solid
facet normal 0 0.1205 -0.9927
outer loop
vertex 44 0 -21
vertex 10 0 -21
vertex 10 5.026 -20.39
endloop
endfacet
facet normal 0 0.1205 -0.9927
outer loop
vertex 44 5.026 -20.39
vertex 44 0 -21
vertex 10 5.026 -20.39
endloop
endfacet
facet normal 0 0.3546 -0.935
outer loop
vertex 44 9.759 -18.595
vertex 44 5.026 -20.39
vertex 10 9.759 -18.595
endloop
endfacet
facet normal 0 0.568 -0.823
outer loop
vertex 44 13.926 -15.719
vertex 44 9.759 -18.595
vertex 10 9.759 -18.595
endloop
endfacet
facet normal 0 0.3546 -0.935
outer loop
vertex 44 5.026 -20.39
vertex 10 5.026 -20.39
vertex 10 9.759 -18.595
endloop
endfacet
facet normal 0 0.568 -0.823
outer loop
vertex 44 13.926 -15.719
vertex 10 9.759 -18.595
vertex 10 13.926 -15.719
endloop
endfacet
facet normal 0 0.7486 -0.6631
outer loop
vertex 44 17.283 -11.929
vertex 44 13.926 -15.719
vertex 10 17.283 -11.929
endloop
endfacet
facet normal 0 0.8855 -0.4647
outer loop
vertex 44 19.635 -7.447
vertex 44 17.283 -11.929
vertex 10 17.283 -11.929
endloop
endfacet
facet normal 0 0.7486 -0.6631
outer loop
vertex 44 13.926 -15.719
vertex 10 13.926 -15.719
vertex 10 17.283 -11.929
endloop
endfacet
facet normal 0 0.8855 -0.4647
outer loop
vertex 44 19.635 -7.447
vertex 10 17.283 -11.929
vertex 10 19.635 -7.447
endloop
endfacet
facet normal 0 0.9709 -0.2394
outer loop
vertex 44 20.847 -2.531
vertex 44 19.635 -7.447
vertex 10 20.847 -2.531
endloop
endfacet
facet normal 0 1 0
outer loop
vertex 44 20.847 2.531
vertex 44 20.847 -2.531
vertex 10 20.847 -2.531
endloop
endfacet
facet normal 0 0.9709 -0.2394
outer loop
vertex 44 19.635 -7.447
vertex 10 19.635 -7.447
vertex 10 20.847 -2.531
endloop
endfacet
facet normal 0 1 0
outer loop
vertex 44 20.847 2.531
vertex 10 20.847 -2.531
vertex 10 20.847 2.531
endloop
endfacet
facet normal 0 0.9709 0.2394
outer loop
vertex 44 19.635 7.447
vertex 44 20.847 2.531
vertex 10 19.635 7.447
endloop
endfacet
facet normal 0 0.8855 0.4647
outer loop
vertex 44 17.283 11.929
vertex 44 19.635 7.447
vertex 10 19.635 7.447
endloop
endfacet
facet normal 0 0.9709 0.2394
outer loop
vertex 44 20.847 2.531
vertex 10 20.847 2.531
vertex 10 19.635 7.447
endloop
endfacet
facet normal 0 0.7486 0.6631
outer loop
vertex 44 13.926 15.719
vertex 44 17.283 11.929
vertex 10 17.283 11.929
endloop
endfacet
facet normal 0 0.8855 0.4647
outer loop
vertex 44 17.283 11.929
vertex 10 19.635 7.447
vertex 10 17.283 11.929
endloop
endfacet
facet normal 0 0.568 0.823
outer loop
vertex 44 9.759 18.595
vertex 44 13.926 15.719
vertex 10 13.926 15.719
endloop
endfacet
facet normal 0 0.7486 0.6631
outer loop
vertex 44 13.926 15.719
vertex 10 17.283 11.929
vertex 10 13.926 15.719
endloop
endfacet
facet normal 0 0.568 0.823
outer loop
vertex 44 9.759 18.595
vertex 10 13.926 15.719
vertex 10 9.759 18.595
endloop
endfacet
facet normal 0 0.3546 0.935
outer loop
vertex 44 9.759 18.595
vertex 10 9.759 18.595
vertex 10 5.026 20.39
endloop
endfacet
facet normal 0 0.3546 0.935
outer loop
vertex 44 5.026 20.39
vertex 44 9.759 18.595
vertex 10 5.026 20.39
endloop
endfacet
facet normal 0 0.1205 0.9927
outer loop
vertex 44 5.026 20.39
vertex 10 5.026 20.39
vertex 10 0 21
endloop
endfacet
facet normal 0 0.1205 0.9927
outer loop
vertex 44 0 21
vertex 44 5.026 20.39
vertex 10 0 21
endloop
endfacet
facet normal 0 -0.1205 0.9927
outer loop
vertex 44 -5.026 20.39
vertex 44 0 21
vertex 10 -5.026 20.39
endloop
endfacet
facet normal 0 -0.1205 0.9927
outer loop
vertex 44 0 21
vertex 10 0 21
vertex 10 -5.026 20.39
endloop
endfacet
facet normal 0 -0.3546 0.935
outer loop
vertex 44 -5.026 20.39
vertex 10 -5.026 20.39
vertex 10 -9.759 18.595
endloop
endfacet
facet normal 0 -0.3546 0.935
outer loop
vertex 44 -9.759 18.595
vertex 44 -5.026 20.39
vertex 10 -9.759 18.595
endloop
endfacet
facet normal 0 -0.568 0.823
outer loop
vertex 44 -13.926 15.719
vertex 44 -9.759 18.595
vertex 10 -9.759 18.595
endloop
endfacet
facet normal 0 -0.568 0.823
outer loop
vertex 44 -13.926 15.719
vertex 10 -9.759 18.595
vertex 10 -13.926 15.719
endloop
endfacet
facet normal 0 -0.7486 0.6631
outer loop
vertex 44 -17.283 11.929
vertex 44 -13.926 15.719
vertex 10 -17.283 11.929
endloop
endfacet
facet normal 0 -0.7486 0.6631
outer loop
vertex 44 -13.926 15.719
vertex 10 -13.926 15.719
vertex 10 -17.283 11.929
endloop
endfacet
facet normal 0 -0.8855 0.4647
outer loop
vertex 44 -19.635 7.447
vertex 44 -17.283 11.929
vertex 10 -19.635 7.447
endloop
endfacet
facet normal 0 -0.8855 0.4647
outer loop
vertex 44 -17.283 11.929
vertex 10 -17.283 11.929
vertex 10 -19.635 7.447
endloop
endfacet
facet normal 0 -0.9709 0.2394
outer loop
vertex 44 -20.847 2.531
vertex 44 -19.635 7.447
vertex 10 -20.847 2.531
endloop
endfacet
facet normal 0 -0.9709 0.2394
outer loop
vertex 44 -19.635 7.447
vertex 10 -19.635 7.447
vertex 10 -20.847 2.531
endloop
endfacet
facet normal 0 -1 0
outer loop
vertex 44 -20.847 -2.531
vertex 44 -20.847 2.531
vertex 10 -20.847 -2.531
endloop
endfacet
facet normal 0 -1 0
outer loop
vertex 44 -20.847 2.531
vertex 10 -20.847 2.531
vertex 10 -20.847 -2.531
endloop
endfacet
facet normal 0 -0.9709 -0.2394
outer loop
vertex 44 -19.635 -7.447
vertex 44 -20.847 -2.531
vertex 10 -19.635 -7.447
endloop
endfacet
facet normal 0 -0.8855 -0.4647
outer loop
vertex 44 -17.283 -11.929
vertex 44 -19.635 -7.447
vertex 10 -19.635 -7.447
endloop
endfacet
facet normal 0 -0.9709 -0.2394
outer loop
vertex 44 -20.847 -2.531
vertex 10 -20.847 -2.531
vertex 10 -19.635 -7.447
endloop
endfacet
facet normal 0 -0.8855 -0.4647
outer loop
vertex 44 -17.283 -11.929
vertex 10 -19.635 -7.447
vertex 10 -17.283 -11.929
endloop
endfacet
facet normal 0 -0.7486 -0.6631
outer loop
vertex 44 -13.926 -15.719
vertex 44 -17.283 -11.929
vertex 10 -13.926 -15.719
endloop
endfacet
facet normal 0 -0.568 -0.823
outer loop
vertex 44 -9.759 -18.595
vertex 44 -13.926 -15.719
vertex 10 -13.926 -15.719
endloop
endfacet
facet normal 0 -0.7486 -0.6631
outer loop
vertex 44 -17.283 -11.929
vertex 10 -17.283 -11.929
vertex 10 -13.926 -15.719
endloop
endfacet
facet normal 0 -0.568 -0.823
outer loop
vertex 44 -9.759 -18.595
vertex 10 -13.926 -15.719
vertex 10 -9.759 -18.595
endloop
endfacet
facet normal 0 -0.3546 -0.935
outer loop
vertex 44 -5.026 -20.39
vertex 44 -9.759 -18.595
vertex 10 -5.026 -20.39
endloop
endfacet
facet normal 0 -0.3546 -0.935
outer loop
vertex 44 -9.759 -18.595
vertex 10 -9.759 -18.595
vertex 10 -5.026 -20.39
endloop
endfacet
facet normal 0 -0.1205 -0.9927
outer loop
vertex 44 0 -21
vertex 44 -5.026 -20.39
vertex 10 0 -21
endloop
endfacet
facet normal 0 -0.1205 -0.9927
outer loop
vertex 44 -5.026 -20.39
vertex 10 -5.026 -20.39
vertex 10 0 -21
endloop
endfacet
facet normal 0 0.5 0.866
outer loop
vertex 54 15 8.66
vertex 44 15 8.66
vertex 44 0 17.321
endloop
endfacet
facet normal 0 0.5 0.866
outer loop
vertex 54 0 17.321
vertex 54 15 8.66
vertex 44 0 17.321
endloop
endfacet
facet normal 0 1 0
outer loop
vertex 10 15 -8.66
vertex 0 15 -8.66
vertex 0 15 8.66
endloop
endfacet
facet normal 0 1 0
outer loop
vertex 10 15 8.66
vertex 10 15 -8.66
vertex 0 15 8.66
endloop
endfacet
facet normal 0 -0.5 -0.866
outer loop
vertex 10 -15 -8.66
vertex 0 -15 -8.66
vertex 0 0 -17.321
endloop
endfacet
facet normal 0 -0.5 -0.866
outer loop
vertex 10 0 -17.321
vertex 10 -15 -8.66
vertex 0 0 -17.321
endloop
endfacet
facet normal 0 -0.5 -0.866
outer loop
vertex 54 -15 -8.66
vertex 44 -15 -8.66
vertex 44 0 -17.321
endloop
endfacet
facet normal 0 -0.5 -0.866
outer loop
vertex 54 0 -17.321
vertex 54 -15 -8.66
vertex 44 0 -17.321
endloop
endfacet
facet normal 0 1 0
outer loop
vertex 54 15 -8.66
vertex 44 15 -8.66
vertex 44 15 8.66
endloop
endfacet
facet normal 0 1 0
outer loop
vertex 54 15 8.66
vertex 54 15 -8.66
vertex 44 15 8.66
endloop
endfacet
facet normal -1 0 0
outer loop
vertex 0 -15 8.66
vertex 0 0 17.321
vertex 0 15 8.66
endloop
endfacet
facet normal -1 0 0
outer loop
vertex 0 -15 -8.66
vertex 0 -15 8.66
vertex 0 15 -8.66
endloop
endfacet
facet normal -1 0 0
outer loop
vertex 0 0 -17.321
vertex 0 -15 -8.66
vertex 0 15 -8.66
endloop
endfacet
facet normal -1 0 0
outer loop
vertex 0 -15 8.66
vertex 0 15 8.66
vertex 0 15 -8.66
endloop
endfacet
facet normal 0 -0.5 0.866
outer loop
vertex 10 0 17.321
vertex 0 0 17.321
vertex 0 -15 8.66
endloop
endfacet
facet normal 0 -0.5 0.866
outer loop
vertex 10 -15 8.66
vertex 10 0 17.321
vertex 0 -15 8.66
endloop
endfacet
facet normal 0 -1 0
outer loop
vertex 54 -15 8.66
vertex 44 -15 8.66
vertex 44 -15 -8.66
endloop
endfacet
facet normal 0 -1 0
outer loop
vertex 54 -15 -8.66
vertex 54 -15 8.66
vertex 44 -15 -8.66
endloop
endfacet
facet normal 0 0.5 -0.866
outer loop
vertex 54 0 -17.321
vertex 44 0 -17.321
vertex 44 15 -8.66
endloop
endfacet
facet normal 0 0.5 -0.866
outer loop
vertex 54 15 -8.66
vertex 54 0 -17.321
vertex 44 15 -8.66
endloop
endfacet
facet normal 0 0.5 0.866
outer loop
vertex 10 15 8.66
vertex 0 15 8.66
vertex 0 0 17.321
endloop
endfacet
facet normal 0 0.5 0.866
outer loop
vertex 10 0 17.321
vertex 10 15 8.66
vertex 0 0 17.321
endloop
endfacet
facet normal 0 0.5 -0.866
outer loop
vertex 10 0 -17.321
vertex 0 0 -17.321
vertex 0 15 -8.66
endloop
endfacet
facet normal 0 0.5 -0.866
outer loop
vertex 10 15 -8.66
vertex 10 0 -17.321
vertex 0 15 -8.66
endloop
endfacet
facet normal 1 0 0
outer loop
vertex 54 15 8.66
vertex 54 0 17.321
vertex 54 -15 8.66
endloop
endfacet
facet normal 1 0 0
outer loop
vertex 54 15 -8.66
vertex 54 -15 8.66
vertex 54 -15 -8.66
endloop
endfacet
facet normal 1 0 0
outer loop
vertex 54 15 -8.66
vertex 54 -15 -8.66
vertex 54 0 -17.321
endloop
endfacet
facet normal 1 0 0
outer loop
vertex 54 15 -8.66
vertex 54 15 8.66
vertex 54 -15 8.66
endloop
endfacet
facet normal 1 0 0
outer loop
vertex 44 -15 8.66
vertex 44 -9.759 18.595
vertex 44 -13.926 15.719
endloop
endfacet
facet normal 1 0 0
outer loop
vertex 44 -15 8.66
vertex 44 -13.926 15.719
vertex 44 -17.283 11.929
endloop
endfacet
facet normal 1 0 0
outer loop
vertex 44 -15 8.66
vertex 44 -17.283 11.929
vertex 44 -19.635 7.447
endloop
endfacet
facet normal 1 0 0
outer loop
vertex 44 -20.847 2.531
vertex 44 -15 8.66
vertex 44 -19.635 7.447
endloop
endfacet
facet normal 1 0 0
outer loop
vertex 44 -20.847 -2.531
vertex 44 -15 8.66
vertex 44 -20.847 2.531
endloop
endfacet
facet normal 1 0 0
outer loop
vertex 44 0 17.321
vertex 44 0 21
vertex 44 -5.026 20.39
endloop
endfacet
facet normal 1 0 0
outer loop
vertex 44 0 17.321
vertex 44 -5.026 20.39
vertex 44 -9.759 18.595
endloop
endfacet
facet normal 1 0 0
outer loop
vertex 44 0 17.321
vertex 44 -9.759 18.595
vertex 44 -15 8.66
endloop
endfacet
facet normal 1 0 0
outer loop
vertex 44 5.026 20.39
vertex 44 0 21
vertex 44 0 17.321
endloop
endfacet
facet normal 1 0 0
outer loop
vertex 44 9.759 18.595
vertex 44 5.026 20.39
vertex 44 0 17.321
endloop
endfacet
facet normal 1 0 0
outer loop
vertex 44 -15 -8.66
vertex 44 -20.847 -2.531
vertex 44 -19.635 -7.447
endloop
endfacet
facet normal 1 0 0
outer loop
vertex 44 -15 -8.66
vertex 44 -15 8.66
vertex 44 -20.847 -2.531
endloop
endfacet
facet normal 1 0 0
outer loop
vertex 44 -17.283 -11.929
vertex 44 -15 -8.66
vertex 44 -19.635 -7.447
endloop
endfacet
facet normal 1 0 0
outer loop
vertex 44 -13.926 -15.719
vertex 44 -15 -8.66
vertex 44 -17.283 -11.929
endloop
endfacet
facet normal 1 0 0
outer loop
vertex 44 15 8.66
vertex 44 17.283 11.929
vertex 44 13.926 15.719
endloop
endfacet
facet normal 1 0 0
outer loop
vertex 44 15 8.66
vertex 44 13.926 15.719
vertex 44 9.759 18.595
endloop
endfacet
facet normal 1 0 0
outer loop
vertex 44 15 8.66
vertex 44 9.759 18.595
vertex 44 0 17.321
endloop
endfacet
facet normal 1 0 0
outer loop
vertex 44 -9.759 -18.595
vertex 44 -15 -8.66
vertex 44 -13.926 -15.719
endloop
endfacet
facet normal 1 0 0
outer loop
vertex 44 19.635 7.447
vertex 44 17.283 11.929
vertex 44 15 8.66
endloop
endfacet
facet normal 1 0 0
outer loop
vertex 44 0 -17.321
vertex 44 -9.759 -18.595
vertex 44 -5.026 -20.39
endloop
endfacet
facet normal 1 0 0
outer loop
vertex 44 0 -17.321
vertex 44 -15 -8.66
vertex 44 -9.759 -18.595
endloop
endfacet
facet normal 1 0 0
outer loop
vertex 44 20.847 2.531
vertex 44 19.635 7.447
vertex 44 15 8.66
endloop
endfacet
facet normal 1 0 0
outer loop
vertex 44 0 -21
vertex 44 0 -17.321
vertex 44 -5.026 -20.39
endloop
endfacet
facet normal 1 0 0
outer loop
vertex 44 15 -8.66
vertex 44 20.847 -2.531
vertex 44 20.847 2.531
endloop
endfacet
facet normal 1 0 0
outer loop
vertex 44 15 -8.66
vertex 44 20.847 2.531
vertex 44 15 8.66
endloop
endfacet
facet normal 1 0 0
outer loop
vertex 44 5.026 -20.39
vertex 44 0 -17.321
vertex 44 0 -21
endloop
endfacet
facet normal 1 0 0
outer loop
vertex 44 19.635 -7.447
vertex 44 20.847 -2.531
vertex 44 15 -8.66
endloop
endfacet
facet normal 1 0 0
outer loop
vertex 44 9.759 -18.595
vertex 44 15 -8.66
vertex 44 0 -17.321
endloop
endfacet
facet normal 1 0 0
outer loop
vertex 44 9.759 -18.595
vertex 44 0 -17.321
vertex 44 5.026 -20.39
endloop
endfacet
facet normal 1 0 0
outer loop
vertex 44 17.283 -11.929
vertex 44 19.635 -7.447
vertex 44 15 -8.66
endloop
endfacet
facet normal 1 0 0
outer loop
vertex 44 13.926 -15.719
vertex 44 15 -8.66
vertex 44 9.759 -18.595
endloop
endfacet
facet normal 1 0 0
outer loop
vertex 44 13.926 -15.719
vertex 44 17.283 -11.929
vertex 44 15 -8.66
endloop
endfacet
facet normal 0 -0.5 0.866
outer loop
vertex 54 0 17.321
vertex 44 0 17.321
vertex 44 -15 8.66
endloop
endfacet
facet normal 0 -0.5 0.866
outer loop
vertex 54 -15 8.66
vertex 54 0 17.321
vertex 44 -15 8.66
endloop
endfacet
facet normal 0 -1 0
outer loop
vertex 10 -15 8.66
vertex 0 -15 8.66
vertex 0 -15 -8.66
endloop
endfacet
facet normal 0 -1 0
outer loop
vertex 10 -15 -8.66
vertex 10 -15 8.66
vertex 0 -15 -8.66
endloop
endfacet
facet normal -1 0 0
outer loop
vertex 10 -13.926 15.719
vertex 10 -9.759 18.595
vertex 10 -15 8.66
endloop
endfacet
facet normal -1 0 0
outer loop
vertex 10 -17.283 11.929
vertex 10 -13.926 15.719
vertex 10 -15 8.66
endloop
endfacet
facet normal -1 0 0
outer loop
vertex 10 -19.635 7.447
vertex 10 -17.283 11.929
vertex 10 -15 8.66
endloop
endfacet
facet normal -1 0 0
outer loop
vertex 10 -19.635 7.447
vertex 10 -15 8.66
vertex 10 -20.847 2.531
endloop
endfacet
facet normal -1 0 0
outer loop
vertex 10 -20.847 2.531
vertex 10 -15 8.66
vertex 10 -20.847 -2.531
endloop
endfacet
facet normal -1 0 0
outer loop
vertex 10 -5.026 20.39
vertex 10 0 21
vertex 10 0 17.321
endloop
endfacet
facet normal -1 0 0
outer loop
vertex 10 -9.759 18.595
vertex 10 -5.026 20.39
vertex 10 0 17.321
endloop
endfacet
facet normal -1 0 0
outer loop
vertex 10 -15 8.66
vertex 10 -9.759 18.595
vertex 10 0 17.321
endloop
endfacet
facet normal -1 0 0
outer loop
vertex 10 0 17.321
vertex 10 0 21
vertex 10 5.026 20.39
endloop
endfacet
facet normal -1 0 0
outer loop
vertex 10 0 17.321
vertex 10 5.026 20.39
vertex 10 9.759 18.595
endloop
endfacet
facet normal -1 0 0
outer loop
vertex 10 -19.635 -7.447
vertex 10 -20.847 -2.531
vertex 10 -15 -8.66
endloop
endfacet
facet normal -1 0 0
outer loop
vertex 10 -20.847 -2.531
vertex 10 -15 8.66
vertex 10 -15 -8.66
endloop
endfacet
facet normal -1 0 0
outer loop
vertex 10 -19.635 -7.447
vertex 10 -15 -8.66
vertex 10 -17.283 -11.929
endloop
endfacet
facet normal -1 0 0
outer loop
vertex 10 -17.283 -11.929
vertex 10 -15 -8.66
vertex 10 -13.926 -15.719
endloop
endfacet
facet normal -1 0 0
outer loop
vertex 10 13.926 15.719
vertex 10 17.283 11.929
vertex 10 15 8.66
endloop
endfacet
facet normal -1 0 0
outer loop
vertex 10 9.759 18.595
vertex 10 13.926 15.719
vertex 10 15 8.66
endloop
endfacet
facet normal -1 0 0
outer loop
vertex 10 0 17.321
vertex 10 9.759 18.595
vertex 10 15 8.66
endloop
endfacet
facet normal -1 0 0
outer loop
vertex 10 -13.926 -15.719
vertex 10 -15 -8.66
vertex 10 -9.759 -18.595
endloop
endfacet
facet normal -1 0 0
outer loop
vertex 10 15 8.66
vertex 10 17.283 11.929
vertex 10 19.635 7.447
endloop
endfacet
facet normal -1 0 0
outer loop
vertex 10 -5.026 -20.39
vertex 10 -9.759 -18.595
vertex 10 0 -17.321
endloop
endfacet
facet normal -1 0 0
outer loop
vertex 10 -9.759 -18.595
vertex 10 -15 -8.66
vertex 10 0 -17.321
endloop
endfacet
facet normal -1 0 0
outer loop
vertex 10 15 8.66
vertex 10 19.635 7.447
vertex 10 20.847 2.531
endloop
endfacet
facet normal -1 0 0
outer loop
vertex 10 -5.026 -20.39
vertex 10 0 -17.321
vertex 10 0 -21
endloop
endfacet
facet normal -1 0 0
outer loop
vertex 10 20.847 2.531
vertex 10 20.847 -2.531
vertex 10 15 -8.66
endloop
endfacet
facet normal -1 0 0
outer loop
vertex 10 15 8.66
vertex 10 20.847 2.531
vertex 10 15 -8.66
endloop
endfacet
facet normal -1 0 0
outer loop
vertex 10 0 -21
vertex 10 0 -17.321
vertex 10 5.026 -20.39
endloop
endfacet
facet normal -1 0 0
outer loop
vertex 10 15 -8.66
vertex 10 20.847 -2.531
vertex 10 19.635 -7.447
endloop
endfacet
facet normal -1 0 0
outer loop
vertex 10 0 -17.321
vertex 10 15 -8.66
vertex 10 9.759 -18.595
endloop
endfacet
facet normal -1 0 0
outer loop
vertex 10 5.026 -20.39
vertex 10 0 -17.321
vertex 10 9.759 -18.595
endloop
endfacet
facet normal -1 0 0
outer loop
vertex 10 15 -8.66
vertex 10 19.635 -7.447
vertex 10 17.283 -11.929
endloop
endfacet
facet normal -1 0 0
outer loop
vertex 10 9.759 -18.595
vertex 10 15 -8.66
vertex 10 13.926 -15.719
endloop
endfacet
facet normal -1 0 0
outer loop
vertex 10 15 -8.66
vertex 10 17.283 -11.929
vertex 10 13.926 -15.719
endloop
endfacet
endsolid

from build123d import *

# Parameters (mm, degrees)
EXTRUDE_305_DEPTH = 10
SKETCH_2_R        = 21
EXTRUDE_1_DEPTH   = 34
EXTRUDE_2_DEPTH   = 10


with BuildPart() as part:
    # Эскиз1 → Extrude 305 (new body)
    with BuildSketch(Plane(origin=(0, 0, 0), x_dir=(0, 0, -1), z_dir=(1, 0, 0))):
        Polygon((17.320508076, 0), (8.660254038, 15), (-8.660254038, 15), (-17.320508076, 0), (-8.660254038, -15), (8.660254038, -15), align=None)
    extrude(amount=EXTRUDE_305_DEPTH)

    # Эскиз2 → Бобышка-Вытянуть1 (add)
    with BuildSketch(Plane(origin=(10, 0, 0), x_dir=(0, 0, -1), z_dir=(1, 0, 0))):
        Circle(SKETCH_2_R)
    extrude(amount=EXTRUDE_1_DEPTH)

    # Эскиз3 → Бобышка-Вытянуть2 (add)
    with BuildSketch(Plane(origin=(44, 0, 0), x_dir=(0, 0, -1), z_dir=(1, 0, 0))):
        Polygon((17.320508076, 0), (8.660254038, 15), (-8.660254038, 15), (-17.320508076, 0), (-8.660254038, -15), (8.660254038, -15), align=None)
    extrude(amount=EXTRUDE_2_DEPTH)


solid = part.part
